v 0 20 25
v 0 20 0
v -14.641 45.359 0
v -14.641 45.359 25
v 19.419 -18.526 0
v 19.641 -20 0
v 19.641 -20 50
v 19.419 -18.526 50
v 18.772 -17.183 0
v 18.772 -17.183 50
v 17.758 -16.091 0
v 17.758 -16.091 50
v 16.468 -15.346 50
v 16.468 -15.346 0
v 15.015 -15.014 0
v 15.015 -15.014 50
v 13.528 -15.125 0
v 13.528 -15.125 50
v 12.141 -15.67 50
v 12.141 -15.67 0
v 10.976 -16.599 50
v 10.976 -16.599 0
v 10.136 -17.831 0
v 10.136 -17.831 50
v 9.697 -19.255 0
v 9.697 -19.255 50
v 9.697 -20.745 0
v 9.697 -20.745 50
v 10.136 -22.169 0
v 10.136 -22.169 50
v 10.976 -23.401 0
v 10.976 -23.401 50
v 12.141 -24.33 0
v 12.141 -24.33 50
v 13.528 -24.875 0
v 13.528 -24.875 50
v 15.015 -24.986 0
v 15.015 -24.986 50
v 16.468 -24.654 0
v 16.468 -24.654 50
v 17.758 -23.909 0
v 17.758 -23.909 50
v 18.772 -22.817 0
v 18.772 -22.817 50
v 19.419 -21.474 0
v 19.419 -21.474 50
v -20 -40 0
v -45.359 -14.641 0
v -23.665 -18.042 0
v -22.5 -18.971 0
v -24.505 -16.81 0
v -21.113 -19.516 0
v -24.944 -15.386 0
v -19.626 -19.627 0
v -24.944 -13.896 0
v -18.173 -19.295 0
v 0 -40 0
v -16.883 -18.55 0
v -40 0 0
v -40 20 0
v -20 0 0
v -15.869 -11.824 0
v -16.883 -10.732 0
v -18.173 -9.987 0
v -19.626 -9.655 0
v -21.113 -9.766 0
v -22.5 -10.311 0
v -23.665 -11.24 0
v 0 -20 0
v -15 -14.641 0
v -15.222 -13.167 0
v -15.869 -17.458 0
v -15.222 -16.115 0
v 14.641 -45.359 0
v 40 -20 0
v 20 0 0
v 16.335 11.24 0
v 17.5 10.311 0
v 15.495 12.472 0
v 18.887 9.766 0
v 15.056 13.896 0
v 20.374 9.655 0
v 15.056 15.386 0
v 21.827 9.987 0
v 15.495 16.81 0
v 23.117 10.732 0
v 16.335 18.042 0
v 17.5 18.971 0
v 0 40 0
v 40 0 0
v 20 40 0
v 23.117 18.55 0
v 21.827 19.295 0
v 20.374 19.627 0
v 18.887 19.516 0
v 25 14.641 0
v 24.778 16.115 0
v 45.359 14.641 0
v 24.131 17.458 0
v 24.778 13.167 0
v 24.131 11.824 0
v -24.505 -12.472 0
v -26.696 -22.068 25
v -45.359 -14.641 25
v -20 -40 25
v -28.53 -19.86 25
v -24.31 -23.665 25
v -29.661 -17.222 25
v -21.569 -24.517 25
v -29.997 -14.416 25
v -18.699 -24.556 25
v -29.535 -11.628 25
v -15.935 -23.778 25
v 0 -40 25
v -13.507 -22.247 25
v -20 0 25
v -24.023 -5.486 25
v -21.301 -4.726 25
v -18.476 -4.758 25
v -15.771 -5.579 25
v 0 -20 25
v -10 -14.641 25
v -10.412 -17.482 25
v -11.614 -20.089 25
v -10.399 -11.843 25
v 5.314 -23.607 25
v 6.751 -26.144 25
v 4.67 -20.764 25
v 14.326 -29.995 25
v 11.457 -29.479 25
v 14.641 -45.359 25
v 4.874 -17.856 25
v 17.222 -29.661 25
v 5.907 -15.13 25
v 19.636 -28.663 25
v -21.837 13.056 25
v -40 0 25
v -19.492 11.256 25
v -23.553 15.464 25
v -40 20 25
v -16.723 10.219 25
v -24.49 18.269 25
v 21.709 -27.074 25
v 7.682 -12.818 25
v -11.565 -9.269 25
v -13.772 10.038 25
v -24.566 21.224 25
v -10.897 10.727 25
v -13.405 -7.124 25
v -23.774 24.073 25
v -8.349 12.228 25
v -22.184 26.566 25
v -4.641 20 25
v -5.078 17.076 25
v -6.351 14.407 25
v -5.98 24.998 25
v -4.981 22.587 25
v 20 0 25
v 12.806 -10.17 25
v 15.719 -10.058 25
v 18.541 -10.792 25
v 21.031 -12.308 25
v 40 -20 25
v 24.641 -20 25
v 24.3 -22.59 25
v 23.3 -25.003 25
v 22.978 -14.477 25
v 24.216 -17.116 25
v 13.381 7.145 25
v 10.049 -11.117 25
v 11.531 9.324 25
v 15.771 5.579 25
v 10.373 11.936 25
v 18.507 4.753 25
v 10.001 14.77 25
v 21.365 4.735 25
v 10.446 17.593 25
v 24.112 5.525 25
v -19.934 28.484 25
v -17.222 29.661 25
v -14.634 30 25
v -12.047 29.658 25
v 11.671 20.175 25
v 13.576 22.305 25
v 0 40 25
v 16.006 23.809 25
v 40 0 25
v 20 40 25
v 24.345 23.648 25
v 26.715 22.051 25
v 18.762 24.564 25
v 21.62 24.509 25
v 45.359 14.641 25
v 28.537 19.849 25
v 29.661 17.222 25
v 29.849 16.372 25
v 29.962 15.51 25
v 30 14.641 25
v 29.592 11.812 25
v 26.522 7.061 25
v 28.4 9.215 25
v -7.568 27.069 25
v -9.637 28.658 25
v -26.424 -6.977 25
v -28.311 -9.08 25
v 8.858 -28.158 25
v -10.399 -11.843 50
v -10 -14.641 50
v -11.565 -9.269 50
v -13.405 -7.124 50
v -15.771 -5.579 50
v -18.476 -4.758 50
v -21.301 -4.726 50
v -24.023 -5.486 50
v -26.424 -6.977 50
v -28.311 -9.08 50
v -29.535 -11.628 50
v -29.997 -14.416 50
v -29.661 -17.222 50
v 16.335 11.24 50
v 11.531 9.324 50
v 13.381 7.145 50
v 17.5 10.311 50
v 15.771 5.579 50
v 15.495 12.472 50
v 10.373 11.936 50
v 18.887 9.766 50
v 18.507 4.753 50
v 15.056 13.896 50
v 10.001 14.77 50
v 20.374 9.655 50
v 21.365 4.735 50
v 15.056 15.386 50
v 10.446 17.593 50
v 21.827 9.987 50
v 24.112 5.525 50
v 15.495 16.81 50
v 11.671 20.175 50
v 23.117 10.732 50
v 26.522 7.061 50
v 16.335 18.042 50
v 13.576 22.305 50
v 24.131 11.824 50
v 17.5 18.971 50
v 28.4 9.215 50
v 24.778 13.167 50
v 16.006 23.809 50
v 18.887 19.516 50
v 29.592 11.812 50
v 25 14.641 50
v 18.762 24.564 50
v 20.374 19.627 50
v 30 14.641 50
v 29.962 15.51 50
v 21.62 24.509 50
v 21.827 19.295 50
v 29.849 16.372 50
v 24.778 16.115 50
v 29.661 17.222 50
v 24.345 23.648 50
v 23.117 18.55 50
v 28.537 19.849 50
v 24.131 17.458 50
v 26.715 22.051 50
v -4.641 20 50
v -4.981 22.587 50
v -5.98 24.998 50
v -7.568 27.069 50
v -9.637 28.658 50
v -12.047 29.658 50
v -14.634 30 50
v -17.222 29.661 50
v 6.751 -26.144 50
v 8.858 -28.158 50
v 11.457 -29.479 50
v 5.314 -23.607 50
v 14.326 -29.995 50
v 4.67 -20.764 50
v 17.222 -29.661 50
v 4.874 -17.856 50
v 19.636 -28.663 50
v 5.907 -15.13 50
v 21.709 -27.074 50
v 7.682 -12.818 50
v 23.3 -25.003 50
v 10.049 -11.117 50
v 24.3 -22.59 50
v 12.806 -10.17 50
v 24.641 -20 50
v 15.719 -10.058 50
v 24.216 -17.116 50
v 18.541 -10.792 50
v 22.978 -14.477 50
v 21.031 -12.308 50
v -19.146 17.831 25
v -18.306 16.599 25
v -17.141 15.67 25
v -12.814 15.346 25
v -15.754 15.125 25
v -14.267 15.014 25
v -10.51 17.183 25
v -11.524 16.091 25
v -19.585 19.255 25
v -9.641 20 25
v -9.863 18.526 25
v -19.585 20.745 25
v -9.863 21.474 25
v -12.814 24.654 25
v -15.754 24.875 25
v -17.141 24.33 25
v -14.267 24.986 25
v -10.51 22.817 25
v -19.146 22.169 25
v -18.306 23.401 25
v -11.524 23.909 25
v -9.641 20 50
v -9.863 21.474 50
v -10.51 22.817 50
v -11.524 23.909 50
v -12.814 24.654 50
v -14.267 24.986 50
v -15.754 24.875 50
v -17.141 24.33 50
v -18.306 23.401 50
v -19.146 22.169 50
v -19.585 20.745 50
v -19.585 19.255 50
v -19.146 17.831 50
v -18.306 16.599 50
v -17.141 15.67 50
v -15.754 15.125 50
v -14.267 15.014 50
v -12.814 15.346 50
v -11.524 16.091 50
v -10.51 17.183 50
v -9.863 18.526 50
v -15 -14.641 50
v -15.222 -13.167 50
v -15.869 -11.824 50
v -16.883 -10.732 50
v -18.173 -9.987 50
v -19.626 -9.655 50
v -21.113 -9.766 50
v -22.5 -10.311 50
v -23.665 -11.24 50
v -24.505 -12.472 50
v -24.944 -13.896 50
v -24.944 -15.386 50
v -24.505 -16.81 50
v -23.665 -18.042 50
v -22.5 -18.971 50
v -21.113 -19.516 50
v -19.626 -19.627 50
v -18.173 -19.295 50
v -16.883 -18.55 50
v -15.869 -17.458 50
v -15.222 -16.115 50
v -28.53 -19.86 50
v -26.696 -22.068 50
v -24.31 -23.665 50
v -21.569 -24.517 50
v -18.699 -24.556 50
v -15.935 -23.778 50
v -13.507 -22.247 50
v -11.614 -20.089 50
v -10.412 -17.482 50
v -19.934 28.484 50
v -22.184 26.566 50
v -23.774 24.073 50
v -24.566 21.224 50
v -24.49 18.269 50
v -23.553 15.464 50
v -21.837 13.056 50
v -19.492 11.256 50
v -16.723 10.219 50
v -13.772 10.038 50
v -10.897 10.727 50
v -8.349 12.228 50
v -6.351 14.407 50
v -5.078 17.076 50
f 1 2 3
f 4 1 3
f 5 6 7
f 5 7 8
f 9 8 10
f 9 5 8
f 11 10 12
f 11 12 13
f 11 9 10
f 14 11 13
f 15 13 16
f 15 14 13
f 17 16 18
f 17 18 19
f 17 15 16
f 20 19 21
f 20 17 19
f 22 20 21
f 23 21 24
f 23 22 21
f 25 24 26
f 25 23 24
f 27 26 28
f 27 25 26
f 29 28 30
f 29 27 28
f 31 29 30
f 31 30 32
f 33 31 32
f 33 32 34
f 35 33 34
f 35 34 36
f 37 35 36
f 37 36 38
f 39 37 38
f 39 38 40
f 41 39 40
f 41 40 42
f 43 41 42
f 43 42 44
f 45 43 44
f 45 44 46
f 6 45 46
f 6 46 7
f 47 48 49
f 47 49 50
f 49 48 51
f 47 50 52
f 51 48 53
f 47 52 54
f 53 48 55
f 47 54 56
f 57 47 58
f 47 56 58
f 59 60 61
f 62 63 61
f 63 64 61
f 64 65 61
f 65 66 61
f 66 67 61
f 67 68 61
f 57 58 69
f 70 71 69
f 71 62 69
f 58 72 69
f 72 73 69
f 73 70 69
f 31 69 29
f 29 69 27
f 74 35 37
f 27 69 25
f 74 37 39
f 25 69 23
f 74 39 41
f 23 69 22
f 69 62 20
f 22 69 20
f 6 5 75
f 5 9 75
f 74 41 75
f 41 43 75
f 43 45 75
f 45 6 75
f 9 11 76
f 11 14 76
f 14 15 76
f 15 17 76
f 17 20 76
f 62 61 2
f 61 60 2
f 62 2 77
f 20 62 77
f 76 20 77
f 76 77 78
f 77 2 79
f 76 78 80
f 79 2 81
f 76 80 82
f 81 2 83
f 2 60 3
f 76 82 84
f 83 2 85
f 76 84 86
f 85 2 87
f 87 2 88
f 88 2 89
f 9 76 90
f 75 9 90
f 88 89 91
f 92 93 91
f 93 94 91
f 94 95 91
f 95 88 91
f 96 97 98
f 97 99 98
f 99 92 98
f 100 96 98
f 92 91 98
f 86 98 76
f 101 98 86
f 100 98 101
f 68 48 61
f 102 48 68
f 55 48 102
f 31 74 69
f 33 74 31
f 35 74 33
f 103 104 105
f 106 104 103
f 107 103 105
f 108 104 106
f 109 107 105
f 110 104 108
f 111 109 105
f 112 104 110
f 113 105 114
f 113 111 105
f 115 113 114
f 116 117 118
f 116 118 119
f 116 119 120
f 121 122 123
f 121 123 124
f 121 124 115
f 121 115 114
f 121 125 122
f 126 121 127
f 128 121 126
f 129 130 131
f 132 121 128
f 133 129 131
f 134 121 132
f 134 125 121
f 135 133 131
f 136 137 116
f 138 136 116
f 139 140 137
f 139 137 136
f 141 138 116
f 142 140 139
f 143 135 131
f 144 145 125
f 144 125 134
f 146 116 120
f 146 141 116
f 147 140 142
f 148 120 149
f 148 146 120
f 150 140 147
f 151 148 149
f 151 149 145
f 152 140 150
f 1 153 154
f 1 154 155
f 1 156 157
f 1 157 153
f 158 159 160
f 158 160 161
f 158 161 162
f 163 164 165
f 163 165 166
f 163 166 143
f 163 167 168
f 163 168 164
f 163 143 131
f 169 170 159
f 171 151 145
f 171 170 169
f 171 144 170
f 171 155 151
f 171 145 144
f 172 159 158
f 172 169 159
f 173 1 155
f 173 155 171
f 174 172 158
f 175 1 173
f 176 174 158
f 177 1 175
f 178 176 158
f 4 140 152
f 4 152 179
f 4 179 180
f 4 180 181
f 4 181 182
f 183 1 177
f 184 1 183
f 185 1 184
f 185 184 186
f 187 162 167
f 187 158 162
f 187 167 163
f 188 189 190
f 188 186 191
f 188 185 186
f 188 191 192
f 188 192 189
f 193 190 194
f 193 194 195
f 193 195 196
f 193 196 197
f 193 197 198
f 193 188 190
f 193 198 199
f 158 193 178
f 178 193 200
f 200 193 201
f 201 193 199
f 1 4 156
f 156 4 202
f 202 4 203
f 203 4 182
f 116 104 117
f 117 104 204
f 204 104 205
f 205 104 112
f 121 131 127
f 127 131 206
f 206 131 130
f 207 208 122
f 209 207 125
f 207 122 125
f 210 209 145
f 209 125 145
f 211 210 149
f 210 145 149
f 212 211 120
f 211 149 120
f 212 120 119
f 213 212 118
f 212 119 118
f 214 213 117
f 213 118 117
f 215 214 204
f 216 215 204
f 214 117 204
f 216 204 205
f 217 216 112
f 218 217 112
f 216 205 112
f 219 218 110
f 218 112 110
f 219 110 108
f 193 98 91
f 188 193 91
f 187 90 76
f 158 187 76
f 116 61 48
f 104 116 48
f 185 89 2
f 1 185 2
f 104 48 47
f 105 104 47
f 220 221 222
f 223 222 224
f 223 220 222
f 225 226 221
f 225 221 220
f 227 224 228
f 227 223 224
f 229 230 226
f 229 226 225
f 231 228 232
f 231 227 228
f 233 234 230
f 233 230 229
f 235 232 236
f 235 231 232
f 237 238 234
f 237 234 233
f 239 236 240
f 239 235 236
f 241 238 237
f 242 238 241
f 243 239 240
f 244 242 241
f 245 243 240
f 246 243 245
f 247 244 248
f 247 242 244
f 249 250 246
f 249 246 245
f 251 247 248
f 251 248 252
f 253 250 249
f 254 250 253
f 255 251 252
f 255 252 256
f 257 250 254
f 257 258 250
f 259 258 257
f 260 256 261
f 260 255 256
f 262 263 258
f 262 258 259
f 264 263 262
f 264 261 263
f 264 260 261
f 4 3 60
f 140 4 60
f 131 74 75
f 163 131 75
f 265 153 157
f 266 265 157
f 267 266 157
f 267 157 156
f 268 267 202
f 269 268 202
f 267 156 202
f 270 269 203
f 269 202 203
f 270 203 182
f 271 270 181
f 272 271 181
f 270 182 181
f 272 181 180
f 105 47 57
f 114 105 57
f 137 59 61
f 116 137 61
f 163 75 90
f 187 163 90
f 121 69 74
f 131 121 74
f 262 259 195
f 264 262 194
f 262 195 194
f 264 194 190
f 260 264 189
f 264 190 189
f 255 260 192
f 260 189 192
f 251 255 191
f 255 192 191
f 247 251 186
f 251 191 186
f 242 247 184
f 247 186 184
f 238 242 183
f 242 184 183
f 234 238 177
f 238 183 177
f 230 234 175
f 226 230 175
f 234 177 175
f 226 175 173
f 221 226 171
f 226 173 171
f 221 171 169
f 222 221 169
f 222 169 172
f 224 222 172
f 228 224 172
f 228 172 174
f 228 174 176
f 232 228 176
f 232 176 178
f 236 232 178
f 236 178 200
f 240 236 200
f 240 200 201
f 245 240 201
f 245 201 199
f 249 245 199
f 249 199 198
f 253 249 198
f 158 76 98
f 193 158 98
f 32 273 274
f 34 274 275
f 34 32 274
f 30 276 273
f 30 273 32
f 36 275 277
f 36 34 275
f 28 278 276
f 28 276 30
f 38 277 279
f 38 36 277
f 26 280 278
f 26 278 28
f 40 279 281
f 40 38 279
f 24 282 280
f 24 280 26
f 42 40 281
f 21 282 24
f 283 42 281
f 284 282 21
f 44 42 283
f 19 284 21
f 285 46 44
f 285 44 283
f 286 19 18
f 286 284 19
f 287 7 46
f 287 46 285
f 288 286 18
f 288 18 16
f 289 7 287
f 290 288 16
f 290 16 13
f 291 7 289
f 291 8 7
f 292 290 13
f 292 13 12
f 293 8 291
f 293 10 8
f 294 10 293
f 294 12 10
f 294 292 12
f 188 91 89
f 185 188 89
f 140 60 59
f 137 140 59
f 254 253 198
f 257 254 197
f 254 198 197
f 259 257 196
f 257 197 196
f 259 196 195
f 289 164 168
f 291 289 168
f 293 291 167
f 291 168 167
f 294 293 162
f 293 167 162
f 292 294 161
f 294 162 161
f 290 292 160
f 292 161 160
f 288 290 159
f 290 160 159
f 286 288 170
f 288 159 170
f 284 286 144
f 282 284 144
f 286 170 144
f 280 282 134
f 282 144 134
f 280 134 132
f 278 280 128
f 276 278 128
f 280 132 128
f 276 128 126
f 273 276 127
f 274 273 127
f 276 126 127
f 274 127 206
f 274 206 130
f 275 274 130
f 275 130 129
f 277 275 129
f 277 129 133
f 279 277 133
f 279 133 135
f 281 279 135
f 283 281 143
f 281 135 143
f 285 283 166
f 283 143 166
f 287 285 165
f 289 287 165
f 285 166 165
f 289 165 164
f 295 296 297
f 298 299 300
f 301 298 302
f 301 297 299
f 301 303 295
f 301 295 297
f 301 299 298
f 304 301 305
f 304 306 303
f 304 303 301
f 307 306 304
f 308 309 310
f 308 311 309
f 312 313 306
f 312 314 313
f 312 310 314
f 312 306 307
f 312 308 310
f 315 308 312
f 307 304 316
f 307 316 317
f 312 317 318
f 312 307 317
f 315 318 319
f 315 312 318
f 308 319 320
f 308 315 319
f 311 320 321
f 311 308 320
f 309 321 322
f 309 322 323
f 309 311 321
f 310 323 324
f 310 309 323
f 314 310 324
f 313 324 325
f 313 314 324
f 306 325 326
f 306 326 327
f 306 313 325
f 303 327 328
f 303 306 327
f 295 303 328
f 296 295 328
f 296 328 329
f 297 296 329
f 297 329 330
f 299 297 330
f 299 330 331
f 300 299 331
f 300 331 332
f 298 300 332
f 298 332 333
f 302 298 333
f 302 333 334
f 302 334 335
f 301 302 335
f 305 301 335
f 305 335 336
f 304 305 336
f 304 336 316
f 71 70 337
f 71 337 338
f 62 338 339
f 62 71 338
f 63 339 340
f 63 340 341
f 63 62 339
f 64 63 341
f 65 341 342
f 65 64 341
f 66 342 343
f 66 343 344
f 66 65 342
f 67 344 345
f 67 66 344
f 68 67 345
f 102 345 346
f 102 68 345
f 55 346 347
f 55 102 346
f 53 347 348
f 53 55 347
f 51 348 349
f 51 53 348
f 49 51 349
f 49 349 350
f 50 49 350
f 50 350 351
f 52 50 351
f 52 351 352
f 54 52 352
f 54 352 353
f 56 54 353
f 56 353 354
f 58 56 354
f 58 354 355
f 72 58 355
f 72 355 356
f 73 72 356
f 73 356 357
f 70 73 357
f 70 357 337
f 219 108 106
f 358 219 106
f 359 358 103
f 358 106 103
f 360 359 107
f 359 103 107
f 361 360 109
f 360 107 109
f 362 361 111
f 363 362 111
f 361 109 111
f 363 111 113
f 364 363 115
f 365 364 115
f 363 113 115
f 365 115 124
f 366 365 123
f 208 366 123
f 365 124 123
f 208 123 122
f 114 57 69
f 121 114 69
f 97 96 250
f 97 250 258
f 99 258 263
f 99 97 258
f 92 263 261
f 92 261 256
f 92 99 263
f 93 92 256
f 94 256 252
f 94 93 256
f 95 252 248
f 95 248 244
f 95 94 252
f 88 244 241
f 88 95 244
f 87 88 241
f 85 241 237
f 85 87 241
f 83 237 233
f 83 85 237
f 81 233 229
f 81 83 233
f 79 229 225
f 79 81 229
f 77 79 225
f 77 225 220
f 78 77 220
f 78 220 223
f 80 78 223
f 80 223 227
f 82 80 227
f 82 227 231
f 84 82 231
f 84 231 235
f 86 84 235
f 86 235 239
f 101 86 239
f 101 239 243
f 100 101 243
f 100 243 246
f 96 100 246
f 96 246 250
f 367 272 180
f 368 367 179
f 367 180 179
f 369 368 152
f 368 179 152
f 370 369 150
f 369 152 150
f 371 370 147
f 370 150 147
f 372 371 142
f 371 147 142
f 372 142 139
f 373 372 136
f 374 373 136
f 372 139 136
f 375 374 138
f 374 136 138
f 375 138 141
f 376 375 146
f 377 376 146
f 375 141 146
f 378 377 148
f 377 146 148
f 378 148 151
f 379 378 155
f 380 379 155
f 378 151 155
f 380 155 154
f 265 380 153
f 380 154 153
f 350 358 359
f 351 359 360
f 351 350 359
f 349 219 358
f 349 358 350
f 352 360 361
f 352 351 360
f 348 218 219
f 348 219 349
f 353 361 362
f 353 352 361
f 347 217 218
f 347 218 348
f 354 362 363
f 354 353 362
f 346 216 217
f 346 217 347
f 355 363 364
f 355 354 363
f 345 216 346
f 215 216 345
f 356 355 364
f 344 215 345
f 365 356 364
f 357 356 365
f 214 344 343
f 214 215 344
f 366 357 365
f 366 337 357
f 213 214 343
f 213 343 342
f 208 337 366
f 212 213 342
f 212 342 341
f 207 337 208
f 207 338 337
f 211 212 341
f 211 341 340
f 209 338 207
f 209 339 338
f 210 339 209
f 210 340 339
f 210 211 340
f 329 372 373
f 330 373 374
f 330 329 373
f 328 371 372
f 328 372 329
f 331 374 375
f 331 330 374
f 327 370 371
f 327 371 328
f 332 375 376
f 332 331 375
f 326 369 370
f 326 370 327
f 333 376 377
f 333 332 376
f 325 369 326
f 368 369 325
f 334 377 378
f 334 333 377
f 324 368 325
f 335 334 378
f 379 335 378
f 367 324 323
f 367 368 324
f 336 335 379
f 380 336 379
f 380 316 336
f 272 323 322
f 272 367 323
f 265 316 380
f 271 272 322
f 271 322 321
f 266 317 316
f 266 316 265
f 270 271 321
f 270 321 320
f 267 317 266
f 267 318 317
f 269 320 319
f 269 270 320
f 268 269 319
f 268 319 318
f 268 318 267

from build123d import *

# Parameters (mm, degrees)
F0_R     = 5
F1_DEPTH = 25
F2_DEPTH = 50


with BuildPart() as f1:
    # F0 (on Top) → F1 (new body)
    with BuildSketch(Plane.XY):
        Polygon((20, 0), (0, 0), (0, -20), (14.641016, -45.358984), (40, -20), (40, 0), align=None)
        with BuildLine():
            ThreePointArc((24.641016, -20), (22.572166, -26.09072), (17.221643, -29.661282))
            ThreePointArc((17.221643, -29.661282), (6.709867, -13.90928), (24.641016, -20))
        make_face(mode=Mode.SUBTRACT)
        with BuildLine():
            ThreePointArc((24.641016, -20), (6.709867, -13.90928), (17.221643, -29.661282))
            ThreePointArc((17.221643, -29.661282), (22.572166, -26.09072), (24.641016, -20))
        make_face()
        with Locations((14.641016, -20)):
            Circle(F0_R, mode=Mode.SUBTRACT)
        Polygon((0, -20), (0, 0), (-20, 0), (-45.358984, -14.641016), (-20, -40), (0, -40), align=None)
        with BuildLine():
            ThreePointArc((-10, -14.641016), (-18.69862, -24.555975), (-29.661282, -17.221643))
            ThreePointArc((-29.661282, -17.221643), (-21.30138, -4.726057), (-10, -14.641016))
        make_face(mode=Mode.SUBTRACT)
        with BuildLine():
            ThreePointArc((-10, -14.641016), (-21.30138, -4.726057), (-29.661282, -17.221643))
            ThreePointArc((-29.661282, -17.221643), (-18.69862, -24.555975), (-10, -14.641016))
        make_face()
        with Locations((-20, -14.641016)):
            Circle(F0_R, mode=Mode.SUBTRACT)
        Polygon((-20, 0), (0, 0), (0, 20), (-14.641016, 45.358984), (-40, 20), (-40, 0), align=None)
        with BuildLine():
            ThreePointArc((-4.641016, 20), (-20.731736, 12.068851), (-17.221643, 29.661282))
            ThreePointArc((-17.221643, 29.661282), (-8.550296, 27.931149), (-4.641016, 20))
        make_face(mode=Mode.SUBTRACT)
        with BuildLine():
            ThreePointArc((-4.641016, 20), (-8.550296, 27.931149), (-17.221643, 29.661282))
            ThreePointArc((-17.221643, 29.661282), (-20.731736, 12.068851), (-4.641016, 20))
        make_face()
        with Locations((-14.641016, 20)):
            Circle(F0_R, mode=Mode.SUBTRACT)
        with Locations((-14.641016, 20)):
            Circle(F0_R)
        Polygon((0, 20), (0, 0), (20, 0), (45.358984, 14.641016), (20, 40), (0, 40), align=None)
        with BuildLine():
            ThreePointArc((30, 14.641016), (10.085041, 13.339636), (29.661282, 17.221643))
            ThreePointArc((29.661282, 17.221643), (29.914959, 15.942396), (30, 14.641016))
        make_face(mode=Mode.SUBTRACT)
        with BuildLine():
            ThreePointArc((30, 14.641016), (29.914959, 15.942396), (29.661282, 17.221643))
            ThreePointArc((29.661282, 17.221643), (10.085041, 13.339636), (30, 14.641016))
        make_face()
        with Locations((20, 14.641016)):
            Circle(F0_R, mode=Mode.SUBTRACT)
    extrude(amount=F1_DEPTH)

    # F0 (on Top) → F2 (join)
    with BuildSketch(Plane.XY):
        with BuildLine():
            ThreePointArc((-4.641016, 20), (-8.550296, 27.931149), (-17.221643, 29.661282))
            ThreePointArc((-17.221643, 29.661282), (-20.731736, 12.068851), (-4.641016, 20))
        make_face()
        with Locations((-14.641016, 20)):
            Circle(F0_R, mode=Mode.SUBTRACT)
        with BuildLine():
            ThreePointArc((-10, -14.641016), (-21.30138, -4.726057), (-29.661282, -17.221643))
            ThreePointArc((-29.661282, -17.221643), (-18.69862, -24.555975), (-10, -14.641016))
        make_face()
        with Locations((-20, -14.641016)):
            Circle(F0_R, mode=Mode.SUBTRACT)
        with BuildLine():
            ThreePointArc((24.641016, -20), (6.709867, -13.90928), (17.221643, -29.661282))
            ThreePointArc((17.221643, -29.661282), (22.572166, -26.09072), (24.641016, -20))
        make_face()
        with Locations((14.641016, -20)):
            Circle(F0_R, mode=Mode.SUBTRACT)
        with BuildLine():
            ThreePointArc((30, 14.641016), (29.914959, 15.942396), (29.661282, 17.221643))
            ThreePointArc((29.661282, 17.221643), (10.085041, 13.339636), (30, 14.641016))
        make_face()
        with Locations((20, 14.641016)):
            Circle(F0_R, mode=Mode.SUBTRACT)
    extrude(amount=F2_DEPTH)


solid = f1.part
